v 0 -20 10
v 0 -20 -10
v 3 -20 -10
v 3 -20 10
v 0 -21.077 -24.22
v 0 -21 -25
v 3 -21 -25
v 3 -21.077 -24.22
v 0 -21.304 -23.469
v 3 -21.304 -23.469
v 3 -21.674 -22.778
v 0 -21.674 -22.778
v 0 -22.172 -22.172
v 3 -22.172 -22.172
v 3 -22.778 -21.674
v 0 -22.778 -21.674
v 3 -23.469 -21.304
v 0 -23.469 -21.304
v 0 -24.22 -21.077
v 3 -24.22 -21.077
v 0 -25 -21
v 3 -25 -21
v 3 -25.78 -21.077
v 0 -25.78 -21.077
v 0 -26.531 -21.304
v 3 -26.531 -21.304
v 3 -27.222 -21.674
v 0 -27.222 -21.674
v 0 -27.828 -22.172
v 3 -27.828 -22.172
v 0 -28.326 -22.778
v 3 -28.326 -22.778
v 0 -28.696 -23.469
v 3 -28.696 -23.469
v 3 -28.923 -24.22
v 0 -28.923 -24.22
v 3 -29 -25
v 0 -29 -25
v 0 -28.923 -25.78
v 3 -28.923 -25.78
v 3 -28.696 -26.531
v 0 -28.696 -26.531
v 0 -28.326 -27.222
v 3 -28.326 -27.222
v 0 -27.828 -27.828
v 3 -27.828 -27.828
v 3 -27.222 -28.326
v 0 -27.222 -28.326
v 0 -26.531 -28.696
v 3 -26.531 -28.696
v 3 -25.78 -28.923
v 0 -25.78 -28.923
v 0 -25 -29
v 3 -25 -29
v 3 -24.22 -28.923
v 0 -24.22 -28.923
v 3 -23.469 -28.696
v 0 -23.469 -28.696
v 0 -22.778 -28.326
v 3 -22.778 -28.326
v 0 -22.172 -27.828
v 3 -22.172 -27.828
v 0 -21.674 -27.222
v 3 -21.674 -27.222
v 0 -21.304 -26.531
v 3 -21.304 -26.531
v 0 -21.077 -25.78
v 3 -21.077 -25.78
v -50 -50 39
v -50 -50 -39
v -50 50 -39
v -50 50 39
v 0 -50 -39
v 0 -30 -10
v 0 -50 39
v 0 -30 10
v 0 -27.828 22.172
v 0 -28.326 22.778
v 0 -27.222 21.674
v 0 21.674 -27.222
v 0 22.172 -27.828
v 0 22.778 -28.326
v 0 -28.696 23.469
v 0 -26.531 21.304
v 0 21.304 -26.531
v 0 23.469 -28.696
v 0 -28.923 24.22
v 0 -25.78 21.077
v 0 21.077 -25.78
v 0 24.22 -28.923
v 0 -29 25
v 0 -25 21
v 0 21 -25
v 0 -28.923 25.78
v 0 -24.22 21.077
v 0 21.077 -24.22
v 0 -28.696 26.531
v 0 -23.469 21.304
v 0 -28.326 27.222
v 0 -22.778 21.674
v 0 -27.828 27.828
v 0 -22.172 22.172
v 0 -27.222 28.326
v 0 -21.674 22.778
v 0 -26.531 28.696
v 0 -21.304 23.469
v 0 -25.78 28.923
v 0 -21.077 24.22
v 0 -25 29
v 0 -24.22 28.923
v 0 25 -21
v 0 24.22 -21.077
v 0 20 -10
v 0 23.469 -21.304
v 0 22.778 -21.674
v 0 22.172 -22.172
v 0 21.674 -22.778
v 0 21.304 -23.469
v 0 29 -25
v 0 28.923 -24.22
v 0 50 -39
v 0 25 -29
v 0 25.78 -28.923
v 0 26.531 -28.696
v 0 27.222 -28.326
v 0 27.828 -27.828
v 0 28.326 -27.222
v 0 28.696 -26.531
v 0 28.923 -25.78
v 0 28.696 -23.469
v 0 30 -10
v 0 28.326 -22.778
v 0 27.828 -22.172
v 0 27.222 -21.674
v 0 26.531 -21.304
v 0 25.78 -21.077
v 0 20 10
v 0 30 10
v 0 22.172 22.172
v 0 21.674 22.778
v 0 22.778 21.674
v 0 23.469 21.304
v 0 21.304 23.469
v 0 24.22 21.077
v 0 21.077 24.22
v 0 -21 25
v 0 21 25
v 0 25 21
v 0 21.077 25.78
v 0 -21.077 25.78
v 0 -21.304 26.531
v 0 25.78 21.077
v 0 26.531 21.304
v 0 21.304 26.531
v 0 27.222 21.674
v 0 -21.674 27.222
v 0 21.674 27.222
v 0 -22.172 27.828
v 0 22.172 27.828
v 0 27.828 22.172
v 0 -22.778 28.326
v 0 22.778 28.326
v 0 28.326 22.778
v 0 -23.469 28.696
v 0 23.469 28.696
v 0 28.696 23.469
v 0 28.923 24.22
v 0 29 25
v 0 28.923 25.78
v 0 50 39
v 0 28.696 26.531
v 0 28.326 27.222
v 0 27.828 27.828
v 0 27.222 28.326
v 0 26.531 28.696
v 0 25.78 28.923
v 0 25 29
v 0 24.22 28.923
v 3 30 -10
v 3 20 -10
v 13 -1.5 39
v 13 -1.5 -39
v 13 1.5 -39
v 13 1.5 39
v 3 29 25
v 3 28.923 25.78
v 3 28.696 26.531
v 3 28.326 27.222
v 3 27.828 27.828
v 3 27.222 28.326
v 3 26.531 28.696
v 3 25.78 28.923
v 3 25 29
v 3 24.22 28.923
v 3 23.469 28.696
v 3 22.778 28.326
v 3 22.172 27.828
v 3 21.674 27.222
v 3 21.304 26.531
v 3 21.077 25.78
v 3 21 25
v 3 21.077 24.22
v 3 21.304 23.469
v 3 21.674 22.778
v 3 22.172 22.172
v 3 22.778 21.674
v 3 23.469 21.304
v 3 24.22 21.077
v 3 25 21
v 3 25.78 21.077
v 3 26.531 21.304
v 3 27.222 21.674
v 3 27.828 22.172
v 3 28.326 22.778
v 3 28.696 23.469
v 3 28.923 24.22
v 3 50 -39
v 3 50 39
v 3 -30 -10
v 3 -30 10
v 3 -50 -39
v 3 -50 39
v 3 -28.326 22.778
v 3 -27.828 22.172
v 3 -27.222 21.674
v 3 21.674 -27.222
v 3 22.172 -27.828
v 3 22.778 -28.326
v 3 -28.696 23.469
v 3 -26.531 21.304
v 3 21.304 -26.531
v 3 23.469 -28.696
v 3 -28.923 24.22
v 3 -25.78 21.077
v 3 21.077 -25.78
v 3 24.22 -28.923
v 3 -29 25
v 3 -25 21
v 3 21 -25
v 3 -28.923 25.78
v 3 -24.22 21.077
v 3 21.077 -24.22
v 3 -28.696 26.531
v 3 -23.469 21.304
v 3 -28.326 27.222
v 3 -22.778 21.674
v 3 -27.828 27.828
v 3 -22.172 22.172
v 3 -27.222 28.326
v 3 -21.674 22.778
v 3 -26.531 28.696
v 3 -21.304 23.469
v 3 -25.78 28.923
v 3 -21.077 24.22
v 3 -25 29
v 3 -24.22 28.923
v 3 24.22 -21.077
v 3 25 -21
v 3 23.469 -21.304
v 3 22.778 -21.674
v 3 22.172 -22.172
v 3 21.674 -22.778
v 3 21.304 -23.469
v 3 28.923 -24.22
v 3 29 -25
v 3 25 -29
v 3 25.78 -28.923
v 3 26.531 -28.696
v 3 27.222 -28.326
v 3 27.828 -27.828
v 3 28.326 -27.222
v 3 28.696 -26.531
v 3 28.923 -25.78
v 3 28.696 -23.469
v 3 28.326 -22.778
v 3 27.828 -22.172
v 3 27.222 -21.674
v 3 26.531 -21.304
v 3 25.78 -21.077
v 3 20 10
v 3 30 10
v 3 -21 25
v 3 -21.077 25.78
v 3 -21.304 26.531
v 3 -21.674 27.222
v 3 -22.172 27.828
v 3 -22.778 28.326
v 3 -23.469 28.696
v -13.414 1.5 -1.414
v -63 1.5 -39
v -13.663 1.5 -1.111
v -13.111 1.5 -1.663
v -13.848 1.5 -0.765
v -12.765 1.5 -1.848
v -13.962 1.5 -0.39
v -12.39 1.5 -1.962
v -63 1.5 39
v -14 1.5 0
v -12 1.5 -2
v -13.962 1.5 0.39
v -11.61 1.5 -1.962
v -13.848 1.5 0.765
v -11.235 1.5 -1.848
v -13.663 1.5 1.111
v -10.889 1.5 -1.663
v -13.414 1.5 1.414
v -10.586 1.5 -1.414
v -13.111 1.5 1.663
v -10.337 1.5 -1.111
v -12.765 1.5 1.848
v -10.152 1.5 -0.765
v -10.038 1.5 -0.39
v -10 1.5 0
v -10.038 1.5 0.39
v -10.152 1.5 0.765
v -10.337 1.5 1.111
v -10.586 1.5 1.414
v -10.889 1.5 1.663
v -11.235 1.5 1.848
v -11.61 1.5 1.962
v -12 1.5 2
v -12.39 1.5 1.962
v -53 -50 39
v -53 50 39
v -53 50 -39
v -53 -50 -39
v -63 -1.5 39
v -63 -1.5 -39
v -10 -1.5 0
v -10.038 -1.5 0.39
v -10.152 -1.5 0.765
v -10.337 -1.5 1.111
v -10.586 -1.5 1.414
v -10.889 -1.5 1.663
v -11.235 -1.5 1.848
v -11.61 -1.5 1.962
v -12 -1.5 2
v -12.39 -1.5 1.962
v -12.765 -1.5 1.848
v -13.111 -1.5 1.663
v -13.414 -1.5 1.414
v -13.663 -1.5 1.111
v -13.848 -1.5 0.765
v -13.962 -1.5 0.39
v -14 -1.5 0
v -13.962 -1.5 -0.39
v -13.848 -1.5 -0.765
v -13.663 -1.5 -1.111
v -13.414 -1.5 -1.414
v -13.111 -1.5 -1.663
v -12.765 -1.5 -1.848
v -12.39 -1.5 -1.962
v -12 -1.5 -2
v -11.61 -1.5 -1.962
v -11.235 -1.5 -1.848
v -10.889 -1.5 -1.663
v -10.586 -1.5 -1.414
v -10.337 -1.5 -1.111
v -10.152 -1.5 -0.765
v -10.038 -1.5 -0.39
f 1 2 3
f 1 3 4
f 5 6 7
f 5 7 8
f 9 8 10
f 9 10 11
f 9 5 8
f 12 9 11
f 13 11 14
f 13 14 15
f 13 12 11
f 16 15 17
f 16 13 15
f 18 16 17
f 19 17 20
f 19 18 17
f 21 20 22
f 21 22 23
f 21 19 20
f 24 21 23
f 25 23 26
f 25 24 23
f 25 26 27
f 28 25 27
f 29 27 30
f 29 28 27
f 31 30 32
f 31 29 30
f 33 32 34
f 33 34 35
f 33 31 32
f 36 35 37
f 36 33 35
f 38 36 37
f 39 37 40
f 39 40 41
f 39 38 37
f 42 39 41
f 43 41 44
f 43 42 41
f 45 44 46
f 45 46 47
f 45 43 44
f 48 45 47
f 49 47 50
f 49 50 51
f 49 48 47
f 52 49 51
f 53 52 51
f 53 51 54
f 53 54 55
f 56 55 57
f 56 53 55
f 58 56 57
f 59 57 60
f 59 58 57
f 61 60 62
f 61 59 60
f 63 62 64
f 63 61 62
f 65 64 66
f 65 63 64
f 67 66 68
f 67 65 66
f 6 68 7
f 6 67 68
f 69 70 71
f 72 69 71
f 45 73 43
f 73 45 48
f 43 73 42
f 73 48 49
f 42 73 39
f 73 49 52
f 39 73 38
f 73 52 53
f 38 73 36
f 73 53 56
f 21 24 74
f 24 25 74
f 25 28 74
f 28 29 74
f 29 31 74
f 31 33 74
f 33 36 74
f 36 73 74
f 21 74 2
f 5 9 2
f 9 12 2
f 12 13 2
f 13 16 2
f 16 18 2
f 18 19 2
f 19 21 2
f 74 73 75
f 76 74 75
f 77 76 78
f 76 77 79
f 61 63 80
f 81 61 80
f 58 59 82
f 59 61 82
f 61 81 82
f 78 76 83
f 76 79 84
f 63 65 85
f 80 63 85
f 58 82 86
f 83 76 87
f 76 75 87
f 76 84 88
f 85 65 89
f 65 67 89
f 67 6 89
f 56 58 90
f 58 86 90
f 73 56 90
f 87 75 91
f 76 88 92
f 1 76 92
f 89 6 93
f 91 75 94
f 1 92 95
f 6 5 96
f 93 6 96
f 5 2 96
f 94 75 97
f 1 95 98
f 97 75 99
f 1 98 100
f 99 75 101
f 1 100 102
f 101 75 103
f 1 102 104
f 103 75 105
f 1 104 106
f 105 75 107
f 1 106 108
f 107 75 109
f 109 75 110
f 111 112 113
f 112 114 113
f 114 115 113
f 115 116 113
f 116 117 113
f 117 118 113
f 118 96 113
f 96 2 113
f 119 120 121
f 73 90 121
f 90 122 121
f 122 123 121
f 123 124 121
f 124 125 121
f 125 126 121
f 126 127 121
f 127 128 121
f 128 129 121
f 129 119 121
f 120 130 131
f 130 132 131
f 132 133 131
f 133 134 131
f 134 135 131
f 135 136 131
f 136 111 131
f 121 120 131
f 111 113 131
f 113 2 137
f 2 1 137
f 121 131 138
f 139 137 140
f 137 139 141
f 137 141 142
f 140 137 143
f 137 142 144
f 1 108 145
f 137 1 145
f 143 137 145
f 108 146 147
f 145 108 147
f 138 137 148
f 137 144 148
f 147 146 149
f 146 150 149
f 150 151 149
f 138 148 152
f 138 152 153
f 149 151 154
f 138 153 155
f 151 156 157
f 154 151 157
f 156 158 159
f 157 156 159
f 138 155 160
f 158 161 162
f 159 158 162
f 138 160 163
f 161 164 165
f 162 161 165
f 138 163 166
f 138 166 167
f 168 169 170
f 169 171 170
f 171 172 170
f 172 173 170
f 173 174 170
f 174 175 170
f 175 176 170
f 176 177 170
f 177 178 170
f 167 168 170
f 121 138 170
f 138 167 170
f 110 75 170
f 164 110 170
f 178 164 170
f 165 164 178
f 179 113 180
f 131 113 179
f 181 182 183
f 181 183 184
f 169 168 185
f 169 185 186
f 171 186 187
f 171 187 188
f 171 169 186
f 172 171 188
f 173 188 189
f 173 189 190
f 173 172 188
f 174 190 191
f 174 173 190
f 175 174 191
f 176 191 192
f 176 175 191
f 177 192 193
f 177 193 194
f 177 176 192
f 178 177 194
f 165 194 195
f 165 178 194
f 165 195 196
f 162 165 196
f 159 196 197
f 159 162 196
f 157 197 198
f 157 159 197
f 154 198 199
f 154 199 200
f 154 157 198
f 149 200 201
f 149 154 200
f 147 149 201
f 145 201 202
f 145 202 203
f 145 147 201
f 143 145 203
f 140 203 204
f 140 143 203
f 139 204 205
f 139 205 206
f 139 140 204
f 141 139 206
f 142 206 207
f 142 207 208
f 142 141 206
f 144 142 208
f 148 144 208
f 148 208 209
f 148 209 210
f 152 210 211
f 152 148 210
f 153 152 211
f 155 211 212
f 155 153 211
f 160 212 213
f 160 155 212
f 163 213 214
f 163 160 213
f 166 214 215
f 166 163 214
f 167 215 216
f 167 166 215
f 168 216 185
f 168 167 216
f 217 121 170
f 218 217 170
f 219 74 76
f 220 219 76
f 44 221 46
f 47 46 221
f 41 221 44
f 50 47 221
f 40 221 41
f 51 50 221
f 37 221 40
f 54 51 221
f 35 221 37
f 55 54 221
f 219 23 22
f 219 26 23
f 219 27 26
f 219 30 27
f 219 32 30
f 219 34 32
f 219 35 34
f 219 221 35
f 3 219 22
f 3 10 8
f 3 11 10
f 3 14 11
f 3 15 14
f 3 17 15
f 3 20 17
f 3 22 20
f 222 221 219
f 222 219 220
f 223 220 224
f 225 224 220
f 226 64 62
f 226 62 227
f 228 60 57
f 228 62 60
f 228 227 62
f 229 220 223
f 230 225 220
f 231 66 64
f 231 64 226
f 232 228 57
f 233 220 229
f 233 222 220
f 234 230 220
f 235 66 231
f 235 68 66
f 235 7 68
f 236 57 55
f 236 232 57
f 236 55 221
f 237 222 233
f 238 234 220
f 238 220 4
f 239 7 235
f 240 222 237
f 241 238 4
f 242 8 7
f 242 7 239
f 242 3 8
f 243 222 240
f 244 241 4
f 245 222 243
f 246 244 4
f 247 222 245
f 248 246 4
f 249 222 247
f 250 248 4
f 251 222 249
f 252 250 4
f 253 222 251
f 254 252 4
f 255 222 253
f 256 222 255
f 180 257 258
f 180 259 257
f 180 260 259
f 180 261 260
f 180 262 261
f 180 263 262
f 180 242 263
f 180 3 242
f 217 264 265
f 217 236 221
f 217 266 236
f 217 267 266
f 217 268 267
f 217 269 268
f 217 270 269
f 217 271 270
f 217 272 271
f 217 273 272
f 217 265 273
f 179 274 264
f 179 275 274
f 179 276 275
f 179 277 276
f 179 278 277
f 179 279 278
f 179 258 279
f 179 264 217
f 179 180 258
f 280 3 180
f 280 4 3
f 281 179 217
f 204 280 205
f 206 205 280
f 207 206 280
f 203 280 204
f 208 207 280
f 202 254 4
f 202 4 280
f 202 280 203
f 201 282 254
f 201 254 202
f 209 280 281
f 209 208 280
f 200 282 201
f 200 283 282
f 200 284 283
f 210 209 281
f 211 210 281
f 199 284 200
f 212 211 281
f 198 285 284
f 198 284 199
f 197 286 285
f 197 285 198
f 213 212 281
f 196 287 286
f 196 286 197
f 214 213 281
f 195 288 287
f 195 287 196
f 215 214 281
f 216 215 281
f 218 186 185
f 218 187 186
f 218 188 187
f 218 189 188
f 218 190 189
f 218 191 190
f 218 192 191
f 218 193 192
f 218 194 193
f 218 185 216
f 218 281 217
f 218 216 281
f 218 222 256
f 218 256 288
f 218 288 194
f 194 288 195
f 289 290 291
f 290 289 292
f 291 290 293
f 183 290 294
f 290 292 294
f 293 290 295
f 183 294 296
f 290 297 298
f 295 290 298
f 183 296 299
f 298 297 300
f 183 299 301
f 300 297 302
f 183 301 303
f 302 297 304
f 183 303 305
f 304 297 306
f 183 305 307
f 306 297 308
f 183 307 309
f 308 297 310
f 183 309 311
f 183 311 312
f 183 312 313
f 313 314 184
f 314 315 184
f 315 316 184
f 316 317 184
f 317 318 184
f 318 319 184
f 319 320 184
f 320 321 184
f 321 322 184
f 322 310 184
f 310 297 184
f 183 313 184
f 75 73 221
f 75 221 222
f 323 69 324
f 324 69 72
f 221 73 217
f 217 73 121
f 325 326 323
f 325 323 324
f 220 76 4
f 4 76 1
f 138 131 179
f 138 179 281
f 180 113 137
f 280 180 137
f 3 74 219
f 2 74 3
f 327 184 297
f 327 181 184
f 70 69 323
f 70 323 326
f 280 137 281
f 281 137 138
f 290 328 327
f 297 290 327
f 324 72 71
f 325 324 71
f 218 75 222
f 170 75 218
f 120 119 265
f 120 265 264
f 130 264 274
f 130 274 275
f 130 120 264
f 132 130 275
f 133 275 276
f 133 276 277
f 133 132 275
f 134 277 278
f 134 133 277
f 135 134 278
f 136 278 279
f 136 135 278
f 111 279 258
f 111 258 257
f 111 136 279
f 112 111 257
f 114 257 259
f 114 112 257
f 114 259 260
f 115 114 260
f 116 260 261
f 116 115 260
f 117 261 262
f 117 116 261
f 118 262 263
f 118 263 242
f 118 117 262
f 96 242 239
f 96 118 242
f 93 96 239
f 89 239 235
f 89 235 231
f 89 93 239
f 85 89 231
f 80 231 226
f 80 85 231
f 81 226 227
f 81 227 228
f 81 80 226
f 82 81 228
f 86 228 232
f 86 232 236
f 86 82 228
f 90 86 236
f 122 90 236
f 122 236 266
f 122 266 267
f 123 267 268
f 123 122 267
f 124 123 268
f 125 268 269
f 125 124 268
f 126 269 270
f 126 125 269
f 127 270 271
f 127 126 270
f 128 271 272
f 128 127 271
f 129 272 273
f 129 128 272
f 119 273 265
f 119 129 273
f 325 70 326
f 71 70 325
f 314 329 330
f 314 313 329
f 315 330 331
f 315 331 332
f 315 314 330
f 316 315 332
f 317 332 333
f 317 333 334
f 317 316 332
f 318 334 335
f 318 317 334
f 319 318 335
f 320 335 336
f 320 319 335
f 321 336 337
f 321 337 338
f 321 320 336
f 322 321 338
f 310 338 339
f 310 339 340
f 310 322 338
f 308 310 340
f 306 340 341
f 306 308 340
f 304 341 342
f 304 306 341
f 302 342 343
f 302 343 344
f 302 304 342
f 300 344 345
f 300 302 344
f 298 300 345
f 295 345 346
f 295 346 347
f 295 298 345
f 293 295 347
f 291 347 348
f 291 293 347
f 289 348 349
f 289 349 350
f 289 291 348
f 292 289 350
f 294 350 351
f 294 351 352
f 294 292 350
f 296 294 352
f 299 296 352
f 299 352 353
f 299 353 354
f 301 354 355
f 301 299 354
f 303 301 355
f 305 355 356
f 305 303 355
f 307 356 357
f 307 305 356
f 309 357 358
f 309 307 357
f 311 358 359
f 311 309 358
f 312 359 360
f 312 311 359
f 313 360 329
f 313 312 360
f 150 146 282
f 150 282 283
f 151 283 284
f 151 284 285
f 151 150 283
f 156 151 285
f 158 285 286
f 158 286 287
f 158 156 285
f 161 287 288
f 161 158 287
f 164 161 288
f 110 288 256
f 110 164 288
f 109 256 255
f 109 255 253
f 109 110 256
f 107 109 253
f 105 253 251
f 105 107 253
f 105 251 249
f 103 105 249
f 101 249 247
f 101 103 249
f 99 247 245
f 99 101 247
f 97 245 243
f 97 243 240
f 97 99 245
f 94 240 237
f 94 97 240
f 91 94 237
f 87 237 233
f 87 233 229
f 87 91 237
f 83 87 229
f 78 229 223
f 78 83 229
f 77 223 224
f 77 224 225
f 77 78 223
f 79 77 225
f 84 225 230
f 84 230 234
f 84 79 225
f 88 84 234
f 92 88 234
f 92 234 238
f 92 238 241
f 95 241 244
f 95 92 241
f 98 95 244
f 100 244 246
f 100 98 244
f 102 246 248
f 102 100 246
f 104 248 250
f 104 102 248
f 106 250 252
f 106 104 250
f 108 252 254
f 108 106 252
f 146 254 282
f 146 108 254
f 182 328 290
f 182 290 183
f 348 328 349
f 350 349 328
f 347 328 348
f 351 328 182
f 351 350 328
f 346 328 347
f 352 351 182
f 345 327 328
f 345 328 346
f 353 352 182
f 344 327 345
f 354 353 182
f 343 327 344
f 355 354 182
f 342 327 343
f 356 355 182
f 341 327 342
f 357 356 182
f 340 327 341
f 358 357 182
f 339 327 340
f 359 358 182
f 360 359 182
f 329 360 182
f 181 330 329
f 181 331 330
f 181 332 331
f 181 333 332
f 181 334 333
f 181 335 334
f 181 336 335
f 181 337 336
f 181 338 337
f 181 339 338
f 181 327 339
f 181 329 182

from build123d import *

# Parameters (mm, degrees)
F0_W     = 100
F0_H     = 78
F0_R     = 4
F0_W_2   = 10
F0_H_2   = 20
F1_DEPTH = 3
F3_W     = 100
F3_H     = 78
F4_DEPTH = 3
F5_W     = 56
F5_H     = 78
F5_R     = 2
F5_W_2   = 10
F6_DEPTH = 1.5


with BuildPart() as f1:
    # F0 (on Right) → F1 (new body)
    with BuildSketch(Plane.YZ):
        Rectangle(F0_W, F0_H)
        with Locations((-25, -25)):
            Circle(F0_R, mode=Mode.SUBTRACT)
        with Locations((25, -25)):
            Circle(F0_R, mode=Mode.SUBTRACT)
        with Locations((-25, 0)):
            Rectangle(F0_W_2, F0_H_2, mode=Mode.SUBTRACT)
        with Locations((-25, 25)):
            Circle(F0_R, mode=Mode.SUBTRACT)
        with Locations((25, 0)):
            Rectangle(F0_W_2, F0_H_2, mode=Mode.SUBTRACT)
        with Locations((25, 25)):
            Circle(F0_R, mode=Mode.SUBTRACT)
    extrude(amount=F1_DEPTH)


with BuildPart() as f4:
    # F3 (on offset) → F4 (new body)
    with BuildSketch(Plane(origin=(-50, 0, 0), x_dir=(0, 1, 0), z_dir=(-1, 0, 0))):
        Rectangle(F3_W, F3_H)
    extrude(amount=F4_DEPTH)


with BuildPart() as f6:
    # F5 (on Front) → F6 (new body, symmetric)
    with BuildSketch(Plane.XZ):
        with Locations((-25, 0)):
            Rectangle(F5_W, F5_H)
        with Locations((-12, 0)):
            Circle(F5_R, mode=Mode.SUBTRACT)
        with Locations((-58, 0)):
            Rectangle(F5_W_2, F5_H)
        with Locations((8, 0)):
            Rectangle(F5_W_2, F5_H)
    extrude(amount=F6_DEPTH, both=True)


solid = Compound([f1.part, f4.part, f6.part])
